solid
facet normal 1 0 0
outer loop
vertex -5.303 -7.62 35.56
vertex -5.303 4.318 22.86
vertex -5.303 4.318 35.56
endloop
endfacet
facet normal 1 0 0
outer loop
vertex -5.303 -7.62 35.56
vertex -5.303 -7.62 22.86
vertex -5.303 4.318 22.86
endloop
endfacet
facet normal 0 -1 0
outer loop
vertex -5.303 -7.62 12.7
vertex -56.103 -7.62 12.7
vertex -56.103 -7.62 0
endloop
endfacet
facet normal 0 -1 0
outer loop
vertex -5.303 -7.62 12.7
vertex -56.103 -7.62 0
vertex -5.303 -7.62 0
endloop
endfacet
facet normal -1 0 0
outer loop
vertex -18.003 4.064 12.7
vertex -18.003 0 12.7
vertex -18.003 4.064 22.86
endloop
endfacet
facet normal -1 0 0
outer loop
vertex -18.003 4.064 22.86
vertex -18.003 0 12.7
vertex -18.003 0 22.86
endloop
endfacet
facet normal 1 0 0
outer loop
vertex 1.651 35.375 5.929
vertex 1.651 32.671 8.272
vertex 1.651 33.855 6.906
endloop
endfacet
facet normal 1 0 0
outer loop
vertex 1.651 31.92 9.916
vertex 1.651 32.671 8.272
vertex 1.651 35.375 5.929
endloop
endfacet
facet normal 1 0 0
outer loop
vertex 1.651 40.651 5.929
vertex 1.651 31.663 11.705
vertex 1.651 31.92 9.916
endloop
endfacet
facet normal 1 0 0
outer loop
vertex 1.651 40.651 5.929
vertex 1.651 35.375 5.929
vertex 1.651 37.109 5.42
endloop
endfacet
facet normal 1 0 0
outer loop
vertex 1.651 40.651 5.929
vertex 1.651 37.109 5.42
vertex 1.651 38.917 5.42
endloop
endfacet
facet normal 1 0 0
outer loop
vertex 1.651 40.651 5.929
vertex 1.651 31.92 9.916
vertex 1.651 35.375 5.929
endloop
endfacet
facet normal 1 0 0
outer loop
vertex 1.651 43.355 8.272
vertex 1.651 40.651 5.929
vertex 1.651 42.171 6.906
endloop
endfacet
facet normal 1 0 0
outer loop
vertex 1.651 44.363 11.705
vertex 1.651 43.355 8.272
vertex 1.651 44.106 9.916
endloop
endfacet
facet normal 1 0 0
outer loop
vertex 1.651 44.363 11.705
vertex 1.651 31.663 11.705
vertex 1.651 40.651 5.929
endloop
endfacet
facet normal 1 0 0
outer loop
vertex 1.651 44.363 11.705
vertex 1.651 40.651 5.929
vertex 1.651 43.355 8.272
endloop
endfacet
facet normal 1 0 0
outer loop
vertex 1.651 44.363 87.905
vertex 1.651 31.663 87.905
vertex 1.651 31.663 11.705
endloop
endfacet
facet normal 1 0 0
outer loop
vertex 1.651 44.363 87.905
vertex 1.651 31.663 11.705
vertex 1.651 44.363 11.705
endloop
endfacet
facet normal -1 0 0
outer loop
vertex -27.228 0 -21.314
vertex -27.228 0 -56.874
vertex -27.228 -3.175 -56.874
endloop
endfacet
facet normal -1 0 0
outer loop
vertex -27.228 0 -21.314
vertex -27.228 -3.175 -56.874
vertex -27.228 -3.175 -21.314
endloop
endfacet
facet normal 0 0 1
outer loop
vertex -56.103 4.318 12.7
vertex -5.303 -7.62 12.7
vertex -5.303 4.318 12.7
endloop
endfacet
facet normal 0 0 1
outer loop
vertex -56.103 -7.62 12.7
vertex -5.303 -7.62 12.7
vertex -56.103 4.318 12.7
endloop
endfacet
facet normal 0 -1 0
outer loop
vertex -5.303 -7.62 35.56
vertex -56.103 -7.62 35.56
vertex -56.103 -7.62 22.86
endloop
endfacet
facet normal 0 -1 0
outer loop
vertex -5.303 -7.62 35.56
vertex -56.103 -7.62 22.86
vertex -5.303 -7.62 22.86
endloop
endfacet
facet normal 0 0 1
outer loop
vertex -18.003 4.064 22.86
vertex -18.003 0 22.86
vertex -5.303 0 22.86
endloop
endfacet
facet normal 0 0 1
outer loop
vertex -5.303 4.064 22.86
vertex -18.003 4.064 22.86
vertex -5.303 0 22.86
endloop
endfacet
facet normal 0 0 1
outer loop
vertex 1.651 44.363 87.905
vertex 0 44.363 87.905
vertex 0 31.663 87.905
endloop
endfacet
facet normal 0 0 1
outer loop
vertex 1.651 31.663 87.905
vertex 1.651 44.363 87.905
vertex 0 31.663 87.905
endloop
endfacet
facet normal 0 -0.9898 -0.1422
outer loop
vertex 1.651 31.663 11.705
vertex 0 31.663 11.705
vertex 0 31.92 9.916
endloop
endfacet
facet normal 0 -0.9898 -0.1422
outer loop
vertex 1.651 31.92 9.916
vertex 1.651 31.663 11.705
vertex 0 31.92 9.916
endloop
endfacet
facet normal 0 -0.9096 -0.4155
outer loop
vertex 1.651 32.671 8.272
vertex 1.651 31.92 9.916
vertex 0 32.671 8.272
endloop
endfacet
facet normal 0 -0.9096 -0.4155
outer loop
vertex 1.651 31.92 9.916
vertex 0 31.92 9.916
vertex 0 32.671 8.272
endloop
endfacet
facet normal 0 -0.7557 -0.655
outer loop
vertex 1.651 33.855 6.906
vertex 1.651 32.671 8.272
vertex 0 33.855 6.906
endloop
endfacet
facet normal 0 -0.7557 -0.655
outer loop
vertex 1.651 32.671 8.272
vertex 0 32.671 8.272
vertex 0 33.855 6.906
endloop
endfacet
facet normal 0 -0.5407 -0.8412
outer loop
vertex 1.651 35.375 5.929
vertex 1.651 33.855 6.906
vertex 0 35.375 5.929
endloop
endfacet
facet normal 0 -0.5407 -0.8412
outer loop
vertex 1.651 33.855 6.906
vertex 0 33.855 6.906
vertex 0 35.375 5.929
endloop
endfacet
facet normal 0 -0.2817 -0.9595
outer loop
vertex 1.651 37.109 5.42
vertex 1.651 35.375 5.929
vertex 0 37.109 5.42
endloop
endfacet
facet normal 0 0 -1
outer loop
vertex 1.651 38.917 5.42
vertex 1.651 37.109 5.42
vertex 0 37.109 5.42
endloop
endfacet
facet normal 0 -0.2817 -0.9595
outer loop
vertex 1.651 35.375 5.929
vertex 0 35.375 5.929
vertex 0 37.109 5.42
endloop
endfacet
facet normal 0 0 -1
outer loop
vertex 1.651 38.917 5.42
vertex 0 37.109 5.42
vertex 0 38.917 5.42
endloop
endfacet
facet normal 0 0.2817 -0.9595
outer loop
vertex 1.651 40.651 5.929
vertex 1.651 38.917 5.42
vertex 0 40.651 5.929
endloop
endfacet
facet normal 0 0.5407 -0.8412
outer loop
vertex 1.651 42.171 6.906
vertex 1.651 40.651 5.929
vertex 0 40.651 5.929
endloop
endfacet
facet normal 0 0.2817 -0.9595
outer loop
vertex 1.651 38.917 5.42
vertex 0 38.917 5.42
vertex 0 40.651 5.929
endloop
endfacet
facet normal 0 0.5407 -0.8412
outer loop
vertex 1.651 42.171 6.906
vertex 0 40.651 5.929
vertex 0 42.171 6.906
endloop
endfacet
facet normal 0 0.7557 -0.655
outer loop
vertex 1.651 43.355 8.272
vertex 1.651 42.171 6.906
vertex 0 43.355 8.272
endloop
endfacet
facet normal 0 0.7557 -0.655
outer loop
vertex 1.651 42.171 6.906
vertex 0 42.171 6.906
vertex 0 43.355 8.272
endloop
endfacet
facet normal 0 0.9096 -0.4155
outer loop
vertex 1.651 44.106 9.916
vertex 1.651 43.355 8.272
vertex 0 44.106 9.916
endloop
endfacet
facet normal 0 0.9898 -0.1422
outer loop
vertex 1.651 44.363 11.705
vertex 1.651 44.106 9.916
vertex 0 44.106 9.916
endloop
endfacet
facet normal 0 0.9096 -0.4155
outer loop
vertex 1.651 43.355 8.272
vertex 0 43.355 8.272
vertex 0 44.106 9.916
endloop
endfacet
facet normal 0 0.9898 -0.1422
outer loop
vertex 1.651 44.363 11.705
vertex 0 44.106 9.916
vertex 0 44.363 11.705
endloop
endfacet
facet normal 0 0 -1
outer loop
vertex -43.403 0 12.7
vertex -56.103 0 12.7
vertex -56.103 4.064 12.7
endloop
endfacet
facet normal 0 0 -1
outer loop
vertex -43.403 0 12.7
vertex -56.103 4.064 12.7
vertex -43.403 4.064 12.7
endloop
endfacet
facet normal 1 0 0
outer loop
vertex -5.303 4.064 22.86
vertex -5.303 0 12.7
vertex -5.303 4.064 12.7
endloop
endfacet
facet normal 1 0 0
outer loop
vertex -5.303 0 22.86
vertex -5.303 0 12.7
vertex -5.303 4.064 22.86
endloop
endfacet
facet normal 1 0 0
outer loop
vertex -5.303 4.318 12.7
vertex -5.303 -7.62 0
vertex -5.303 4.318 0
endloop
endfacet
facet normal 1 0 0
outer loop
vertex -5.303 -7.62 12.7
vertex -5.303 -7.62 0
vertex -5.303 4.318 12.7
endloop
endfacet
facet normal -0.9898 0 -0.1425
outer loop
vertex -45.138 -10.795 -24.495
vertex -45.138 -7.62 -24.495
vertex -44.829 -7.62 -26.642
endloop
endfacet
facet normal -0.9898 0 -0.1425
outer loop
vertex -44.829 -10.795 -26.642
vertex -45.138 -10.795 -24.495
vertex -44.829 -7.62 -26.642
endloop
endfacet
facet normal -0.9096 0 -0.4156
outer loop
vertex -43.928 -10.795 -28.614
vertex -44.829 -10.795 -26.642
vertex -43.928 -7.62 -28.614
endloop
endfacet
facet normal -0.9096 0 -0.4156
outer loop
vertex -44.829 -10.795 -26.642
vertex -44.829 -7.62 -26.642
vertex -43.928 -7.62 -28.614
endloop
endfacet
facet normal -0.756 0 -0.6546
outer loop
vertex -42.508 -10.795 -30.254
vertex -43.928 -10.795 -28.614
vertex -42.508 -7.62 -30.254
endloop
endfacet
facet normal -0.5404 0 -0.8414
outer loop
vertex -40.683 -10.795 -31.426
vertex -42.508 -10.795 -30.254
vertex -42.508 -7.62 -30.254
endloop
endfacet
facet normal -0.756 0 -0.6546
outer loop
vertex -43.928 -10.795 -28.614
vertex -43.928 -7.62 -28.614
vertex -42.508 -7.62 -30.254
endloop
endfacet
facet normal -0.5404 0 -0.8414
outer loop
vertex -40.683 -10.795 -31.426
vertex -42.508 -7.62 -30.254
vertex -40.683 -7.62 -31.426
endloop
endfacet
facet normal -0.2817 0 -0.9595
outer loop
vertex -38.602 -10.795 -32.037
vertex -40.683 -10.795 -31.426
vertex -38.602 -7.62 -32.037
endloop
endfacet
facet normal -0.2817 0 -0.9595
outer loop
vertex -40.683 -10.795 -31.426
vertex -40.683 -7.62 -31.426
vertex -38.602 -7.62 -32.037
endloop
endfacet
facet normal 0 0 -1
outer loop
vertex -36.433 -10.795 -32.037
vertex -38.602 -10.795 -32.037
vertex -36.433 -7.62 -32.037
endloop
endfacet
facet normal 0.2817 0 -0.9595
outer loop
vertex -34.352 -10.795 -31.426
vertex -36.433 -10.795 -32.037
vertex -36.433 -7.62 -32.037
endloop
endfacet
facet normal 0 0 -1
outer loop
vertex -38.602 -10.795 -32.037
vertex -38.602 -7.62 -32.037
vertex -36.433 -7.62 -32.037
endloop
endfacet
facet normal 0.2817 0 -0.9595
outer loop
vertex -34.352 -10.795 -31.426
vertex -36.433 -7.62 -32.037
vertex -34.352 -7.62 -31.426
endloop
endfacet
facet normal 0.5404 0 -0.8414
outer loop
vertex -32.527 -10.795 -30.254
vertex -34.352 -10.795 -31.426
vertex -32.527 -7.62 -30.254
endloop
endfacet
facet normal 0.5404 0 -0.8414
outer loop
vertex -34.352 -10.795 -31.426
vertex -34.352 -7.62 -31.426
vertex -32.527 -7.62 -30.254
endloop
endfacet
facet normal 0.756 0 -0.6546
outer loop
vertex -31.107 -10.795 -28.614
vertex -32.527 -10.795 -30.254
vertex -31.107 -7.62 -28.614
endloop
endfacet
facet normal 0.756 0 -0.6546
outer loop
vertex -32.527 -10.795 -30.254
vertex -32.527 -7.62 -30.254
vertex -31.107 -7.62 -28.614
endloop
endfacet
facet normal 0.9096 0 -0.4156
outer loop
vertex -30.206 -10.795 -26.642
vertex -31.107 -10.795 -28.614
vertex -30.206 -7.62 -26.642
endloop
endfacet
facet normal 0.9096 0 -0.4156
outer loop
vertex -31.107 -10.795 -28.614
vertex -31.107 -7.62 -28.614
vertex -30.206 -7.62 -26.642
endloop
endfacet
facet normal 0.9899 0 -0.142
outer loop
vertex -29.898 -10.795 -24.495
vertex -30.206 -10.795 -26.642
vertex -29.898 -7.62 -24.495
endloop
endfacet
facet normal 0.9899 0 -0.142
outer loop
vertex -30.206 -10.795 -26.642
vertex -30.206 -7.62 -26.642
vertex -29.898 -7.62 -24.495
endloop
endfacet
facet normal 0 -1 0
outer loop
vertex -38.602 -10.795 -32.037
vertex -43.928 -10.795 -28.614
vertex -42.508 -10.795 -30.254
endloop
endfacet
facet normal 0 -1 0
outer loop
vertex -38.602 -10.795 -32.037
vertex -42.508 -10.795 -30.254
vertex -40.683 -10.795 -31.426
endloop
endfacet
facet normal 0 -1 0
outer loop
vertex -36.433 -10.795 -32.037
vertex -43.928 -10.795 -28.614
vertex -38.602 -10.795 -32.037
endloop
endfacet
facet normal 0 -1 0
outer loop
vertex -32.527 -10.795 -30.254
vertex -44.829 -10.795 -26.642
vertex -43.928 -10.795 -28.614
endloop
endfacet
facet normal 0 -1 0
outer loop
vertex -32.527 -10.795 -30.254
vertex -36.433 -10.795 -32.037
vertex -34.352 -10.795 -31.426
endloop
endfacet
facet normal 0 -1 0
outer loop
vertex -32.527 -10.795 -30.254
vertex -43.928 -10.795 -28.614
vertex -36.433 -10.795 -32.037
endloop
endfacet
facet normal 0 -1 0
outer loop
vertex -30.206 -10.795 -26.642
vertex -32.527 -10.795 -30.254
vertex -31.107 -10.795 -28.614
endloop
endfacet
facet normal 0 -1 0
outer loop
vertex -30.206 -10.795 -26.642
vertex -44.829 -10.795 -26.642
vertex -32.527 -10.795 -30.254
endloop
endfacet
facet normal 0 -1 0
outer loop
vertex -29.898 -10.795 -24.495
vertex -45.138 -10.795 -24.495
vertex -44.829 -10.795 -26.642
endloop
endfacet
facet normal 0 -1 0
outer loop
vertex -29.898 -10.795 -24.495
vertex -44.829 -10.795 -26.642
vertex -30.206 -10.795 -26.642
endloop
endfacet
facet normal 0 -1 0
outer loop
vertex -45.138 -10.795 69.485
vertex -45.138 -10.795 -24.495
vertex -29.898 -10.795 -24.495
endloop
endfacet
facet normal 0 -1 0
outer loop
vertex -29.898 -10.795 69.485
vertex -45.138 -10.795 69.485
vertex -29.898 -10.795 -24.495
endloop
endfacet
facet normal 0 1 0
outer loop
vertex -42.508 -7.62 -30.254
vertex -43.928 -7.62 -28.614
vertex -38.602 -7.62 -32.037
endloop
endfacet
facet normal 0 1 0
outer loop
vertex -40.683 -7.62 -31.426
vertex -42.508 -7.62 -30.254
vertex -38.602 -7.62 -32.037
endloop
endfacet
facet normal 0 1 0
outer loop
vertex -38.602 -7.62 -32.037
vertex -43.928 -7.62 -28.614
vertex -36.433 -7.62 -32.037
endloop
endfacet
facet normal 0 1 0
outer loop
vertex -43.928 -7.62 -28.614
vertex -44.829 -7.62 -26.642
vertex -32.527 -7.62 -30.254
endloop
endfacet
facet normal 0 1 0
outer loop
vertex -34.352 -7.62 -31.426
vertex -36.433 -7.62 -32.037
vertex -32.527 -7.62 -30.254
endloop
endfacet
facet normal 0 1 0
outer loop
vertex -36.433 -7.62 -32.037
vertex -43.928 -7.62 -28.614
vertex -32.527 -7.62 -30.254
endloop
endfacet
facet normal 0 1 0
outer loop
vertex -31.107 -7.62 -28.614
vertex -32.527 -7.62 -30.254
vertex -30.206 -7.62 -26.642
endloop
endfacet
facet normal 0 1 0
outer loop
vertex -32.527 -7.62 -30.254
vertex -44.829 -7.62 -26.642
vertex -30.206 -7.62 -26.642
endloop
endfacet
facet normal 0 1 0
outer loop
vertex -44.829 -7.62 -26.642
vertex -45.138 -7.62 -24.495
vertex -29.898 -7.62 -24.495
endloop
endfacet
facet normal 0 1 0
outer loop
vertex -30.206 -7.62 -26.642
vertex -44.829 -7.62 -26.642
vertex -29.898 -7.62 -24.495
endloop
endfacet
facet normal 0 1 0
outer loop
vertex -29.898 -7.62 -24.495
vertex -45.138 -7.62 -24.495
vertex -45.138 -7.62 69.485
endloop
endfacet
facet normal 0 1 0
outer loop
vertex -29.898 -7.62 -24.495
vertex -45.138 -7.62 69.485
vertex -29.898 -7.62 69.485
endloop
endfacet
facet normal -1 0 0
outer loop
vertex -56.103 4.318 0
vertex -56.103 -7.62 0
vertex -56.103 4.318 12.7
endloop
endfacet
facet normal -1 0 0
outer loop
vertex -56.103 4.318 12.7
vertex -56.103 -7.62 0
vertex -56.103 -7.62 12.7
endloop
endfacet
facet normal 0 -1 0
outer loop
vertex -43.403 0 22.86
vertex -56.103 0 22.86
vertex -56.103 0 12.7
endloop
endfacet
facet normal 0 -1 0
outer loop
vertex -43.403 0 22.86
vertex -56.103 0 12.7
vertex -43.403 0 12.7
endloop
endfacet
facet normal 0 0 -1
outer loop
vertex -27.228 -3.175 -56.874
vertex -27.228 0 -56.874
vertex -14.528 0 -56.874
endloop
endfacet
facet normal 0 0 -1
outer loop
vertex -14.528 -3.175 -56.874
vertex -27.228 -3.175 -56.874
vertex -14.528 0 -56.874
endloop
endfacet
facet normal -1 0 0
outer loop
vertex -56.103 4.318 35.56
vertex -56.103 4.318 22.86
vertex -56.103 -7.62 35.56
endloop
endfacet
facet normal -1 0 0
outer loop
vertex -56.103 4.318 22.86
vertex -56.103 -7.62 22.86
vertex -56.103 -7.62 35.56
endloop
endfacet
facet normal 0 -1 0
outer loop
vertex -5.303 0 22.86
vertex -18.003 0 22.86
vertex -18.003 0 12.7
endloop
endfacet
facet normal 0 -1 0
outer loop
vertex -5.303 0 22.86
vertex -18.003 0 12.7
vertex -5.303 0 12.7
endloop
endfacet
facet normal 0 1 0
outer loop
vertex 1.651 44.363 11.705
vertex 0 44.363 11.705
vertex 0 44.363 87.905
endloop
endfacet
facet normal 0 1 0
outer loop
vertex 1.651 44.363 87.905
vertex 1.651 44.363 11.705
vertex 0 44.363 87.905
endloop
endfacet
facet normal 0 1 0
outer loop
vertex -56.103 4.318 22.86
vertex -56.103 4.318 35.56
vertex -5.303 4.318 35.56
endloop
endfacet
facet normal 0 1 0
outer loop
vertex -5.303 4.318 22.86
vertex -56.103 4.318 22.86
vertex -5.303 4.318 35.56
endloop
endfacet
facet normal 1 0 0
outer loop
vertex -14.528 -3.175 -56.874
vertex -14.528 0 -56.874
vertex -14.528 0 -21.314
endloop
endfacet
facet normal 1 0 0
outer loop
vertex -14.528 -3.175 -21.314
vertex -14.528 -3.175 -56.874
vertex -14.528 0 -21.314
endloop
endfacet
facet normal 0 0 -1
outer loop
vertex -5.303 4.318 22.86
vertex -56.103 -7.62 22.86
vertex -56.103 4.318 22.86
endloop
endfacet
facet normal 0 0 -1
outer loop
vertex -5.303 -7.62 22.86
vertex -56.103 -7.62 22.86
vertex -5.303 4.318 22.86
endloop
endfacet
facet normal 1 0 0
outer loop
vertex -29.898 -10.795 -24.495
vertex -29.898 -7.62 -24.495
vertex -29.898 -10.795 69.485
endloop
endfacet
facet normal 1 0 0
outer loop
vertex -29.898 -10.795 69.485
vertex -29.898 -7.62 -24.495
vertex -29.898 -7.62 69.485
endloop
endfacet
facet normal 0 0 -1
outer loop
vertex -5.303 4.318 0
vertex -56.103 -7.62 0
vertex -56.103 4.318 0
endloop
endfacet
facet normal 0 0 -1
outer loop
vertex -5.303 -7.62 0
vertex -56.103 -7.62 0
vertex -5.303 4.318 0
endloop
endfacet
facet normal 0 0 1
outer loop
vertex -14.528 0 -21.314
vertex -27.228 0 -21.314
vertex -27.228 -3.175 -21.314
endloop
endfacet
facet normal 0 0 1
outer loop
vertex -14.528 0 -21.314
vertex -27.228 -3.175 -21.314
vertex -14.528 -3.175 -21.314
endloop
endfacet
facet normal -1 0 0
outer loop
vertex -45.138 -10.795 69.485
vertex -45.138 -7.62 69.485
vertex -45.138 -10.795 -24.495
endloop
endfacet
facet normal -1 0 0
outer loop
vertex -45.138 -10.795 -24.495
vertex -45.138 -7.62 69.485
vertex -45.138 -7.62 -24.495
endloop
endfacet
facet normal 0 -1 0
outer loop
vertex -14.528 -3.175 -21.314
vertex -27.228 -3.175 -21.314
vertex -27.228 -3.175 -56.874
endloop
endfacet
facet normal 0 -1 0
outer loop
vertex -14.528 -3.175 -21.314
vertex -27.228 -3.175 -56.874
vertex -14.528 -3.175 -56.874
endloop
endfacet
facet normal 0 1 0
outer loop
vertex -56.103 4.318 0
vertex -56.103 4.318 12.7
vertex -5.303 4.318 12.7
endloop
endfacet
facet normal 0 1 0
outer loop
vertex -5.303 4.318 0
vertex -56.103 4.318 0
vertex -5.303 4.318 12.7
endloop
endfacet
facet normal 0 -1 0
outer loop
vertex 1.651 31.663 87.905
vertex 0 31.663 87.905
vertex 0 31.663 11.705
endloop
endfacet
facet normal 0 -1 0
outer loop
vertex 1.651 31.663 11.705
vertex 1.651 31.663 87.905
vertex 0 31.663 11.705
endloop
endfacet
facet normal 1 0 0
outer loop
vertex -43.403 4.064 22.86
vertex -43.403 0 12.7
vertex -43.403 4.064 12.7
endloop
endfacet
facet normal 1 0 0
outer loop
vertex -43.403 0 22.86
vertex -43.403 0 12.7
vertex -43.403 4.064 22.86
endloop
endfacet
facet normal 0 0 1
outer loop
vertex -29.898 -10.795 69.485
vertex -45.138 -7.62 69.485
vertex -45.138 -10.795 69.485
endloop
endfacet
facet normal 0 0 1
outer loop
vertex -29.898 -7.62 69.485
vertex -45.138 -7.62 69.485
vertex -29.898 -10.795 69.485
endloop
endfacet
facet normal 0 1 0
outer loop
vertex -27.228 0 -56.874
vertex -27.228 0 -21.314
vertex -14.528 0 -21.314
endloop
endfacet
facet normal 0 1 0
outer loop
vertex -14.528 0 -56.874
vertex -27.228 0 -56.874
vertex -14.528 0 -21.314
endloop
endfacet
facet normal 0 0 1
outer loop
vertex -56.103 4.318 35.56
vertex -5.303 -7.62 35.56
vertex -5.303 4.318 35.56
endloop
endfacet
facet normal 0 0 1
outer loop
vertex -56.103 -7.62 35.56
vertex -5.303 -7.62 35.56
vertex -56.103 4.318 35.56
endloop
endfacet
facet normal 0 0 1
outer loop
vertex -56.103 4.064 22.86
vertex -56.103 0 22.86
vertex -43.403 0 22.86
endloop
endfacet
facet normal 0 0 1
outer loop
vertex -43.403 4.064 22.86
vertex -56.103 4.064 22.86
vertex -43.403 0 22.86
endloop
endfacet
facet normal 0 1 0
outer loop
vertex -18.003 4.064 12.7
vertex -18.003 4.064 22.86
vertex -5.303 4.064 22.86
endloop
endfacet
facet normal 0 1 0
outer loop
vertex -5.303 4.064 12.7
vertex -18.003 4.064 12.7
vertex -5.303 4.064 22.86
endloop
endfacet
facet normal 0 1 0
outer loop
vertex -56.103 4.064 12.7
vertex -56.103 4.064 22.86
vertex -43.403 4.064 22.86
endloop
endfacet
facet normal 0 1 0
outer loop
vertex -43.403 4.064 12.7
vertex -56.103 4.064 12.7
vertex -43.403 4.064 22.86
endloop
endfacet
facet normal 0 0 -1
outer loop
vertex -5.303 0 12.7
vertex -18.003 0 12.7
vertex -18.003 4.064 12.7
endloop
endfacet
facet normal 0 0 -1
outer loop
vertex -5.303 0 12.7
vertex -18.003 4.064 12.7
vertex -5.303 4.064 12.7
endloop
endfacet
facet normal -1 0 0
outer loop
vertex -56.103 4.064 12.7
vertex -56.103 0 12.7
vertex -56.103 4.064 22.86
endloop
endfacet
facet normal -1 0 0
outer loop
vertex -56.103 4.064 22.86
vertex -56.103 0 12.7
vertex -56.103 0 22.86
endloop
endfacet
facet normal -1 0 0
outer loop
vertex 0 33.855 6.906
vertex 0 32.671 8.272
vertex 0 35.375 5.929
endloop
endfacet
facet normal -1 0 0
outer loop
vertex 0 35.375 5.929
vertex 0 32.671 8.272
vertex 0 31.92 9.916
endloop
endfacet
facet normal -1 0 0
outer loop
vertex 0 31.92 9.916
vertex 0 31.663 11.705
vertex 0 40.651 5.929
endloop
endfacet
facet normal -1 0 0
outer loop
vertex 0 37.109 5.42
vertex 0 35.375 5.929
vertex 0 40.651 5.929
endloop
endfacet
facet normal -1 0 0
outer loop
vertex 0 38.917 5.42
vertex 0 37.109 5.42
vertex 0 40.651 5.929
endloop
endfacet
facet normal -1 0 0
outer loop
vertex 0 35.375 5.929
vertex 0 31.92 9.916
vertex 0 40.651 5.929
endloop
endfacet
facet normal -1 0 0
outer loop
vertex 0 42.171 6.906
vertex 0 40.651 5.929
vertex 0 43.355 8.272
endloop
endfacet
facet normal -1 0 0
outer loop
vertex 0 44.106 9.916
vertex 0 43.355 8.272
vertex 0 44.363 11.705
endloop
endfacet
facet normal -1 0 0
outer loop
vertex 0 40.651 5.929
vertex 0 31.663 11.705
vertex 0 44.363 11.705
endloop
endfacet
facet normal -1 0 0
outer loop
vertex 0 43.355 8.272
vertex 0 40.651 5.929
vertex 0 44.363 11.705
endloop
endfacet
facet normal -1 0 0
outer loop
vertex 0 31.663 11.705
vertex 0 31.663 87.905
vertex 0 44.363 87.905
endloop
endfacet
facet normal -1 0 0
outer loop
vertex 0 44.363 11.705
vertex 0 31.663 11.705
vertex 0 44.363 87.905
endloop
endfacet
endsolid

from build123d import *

# Parameters (mm, degrees)
F0_W          = 12.7
F0_H          = 12.7
F0_W_2        = 25.4
F1_DEPTH      = 7.62
F1_DEPTH_BACK = 4.318
F0_H_2        = 10.16
F2_DEPTH      = 4.064
F3_W          = 15.24
F3_H          = 12.7
F3_H_2        = 56.7852711724
F4_DEPTH      = 3.175
F6_DEPTH      = 1.651
F7_W          = 12.7
F7_H          = 35.56
F8_DEPTH      = 3.175


# Not quite as in the source:
# - a length typed as a fraction of an inch, garbled in the dataset ("3 / 203.2 mm" for 3/8 in), is restored
# - a feature names something its author has since deleted; it is built from what else it names


with BuildPart() as f1:
    # F0 (on Front) → F1 (new body, two sides)
    with BuildSketch(Plane.XZ) as f1_sk:
        with Locations((-11.6530044077, 29.21)):
            Rectangle(F0_W, F0_H)
        with Locations((-30.7030044077, 29.21)):
            Rectangle(F0_W_2, F0_H)
        with Locations((-49.7530044077, 29.21)):
            Rectangle(F0_W, F0_H)
    extrude(amount=F1_DEPTH)
    extrude(f1_sk.sketch, amount=-F1_DEPTH_BACK)


with BuildPart() as f1b:
    # F0 (on Front) → F1, piece 2 (new body, two sides)
    with BuildSketch(Plane.XZ) as f1_2_sk:
        with Locations((-49.7530044077, 6.35)):
            Rectangle(F0_W, F0_H)
        with Locations((-30.7030044077, 6.35)):
            Rectangle(F0_W_2, F0_H)
        with Locations((-11.6530044077, 6.35)):
            Rectangle(F0_W, F0_H)
    extrude(amount=F1_DEPTH)
    extrude(f1_2_sk.sketch, amount=-F1_DEPTH_BACK)


with BuildPart() as f2:
    # F0 (on Front) → F2 (new body)
    with BuildSketch(Plane.XZ):
        with Locations((-11.6530044077, 17.78)):
            Rectangle(F0_W, F0_H_2)
    extrude(amount=-F2_DEPTH)


with BuildPart() as f2b:
    # F0 (on Front) → F2, piece 2 (new body)
    with BuildSketch(Plane.XZ):
        with Locations((-49.7530044077, 17.78)):
            Rectangle(F0_W, F0_H_2)
    extrude(amount=-F2_DEPTH)


with BuildPart() as f4:
    # F3 (on face) → F4 (new body)
    with BuildSketch(Plane.XZ.offset(7.62)):
        with BuildLine():
            ThreePointArc((-45.1375190453, -24.4947288276), (-37.5175190453, -32.1147288276), (-29.8975190453, -24.4947288276))
            Line((-29.8975190453, -24.4947288276), (-29.8975190453, 0))
            Line((-29.8975190453, 0), (-45.1375190453, 0))
            Line((-45.1375190453, 0), (-45.1375190453, -24.4947288276))
        make_face()
        with Locations((-37.5175190453, 6.35)):
            Rectangle(F3_W, F3_H)
        with Locations((-37.5175190453, 41.0926355862)):
            Rectangle(F3_W, F3_H_2)
    extrude(amount=F4_DEPTH)


with BuildPart() as f6:
    # F5 (on Right) → F6 (new body)
    with BuildSketch(Plane.YZ):
        with BuildLine():
            Line((44.3628823752, 87.9049419045), (31.6628823752, 87.9049419045))
            Line((31.6628823752, 87.9049419045), (31.6628823752, 11.7049419045))
            ThreePointArc((31.6628823752, 11.7049419045), (38.0128823752, 5.3549419045), (44.3628823752, 11.7049419045))
            Line((44.3628823752, 11.7049419045), (44.3628823752, 87.9049419045))
        make_face()
    extrude(amount=F6_DEPTH)


with BuildPart() as f8:
    # F7 (on Front) → F8 (new body)
    with BuildSketch(Plane.XZ):
        with Locations((-20.8775842459, -39.0941523947)):
            Rectangle(F7_W, F7_H)
    extrude(amount=F8_DEPTH)


solid = Compound([f1.part, f1b.part, f2.part, f2b.part, f4.part, f6.part, f8.part])
